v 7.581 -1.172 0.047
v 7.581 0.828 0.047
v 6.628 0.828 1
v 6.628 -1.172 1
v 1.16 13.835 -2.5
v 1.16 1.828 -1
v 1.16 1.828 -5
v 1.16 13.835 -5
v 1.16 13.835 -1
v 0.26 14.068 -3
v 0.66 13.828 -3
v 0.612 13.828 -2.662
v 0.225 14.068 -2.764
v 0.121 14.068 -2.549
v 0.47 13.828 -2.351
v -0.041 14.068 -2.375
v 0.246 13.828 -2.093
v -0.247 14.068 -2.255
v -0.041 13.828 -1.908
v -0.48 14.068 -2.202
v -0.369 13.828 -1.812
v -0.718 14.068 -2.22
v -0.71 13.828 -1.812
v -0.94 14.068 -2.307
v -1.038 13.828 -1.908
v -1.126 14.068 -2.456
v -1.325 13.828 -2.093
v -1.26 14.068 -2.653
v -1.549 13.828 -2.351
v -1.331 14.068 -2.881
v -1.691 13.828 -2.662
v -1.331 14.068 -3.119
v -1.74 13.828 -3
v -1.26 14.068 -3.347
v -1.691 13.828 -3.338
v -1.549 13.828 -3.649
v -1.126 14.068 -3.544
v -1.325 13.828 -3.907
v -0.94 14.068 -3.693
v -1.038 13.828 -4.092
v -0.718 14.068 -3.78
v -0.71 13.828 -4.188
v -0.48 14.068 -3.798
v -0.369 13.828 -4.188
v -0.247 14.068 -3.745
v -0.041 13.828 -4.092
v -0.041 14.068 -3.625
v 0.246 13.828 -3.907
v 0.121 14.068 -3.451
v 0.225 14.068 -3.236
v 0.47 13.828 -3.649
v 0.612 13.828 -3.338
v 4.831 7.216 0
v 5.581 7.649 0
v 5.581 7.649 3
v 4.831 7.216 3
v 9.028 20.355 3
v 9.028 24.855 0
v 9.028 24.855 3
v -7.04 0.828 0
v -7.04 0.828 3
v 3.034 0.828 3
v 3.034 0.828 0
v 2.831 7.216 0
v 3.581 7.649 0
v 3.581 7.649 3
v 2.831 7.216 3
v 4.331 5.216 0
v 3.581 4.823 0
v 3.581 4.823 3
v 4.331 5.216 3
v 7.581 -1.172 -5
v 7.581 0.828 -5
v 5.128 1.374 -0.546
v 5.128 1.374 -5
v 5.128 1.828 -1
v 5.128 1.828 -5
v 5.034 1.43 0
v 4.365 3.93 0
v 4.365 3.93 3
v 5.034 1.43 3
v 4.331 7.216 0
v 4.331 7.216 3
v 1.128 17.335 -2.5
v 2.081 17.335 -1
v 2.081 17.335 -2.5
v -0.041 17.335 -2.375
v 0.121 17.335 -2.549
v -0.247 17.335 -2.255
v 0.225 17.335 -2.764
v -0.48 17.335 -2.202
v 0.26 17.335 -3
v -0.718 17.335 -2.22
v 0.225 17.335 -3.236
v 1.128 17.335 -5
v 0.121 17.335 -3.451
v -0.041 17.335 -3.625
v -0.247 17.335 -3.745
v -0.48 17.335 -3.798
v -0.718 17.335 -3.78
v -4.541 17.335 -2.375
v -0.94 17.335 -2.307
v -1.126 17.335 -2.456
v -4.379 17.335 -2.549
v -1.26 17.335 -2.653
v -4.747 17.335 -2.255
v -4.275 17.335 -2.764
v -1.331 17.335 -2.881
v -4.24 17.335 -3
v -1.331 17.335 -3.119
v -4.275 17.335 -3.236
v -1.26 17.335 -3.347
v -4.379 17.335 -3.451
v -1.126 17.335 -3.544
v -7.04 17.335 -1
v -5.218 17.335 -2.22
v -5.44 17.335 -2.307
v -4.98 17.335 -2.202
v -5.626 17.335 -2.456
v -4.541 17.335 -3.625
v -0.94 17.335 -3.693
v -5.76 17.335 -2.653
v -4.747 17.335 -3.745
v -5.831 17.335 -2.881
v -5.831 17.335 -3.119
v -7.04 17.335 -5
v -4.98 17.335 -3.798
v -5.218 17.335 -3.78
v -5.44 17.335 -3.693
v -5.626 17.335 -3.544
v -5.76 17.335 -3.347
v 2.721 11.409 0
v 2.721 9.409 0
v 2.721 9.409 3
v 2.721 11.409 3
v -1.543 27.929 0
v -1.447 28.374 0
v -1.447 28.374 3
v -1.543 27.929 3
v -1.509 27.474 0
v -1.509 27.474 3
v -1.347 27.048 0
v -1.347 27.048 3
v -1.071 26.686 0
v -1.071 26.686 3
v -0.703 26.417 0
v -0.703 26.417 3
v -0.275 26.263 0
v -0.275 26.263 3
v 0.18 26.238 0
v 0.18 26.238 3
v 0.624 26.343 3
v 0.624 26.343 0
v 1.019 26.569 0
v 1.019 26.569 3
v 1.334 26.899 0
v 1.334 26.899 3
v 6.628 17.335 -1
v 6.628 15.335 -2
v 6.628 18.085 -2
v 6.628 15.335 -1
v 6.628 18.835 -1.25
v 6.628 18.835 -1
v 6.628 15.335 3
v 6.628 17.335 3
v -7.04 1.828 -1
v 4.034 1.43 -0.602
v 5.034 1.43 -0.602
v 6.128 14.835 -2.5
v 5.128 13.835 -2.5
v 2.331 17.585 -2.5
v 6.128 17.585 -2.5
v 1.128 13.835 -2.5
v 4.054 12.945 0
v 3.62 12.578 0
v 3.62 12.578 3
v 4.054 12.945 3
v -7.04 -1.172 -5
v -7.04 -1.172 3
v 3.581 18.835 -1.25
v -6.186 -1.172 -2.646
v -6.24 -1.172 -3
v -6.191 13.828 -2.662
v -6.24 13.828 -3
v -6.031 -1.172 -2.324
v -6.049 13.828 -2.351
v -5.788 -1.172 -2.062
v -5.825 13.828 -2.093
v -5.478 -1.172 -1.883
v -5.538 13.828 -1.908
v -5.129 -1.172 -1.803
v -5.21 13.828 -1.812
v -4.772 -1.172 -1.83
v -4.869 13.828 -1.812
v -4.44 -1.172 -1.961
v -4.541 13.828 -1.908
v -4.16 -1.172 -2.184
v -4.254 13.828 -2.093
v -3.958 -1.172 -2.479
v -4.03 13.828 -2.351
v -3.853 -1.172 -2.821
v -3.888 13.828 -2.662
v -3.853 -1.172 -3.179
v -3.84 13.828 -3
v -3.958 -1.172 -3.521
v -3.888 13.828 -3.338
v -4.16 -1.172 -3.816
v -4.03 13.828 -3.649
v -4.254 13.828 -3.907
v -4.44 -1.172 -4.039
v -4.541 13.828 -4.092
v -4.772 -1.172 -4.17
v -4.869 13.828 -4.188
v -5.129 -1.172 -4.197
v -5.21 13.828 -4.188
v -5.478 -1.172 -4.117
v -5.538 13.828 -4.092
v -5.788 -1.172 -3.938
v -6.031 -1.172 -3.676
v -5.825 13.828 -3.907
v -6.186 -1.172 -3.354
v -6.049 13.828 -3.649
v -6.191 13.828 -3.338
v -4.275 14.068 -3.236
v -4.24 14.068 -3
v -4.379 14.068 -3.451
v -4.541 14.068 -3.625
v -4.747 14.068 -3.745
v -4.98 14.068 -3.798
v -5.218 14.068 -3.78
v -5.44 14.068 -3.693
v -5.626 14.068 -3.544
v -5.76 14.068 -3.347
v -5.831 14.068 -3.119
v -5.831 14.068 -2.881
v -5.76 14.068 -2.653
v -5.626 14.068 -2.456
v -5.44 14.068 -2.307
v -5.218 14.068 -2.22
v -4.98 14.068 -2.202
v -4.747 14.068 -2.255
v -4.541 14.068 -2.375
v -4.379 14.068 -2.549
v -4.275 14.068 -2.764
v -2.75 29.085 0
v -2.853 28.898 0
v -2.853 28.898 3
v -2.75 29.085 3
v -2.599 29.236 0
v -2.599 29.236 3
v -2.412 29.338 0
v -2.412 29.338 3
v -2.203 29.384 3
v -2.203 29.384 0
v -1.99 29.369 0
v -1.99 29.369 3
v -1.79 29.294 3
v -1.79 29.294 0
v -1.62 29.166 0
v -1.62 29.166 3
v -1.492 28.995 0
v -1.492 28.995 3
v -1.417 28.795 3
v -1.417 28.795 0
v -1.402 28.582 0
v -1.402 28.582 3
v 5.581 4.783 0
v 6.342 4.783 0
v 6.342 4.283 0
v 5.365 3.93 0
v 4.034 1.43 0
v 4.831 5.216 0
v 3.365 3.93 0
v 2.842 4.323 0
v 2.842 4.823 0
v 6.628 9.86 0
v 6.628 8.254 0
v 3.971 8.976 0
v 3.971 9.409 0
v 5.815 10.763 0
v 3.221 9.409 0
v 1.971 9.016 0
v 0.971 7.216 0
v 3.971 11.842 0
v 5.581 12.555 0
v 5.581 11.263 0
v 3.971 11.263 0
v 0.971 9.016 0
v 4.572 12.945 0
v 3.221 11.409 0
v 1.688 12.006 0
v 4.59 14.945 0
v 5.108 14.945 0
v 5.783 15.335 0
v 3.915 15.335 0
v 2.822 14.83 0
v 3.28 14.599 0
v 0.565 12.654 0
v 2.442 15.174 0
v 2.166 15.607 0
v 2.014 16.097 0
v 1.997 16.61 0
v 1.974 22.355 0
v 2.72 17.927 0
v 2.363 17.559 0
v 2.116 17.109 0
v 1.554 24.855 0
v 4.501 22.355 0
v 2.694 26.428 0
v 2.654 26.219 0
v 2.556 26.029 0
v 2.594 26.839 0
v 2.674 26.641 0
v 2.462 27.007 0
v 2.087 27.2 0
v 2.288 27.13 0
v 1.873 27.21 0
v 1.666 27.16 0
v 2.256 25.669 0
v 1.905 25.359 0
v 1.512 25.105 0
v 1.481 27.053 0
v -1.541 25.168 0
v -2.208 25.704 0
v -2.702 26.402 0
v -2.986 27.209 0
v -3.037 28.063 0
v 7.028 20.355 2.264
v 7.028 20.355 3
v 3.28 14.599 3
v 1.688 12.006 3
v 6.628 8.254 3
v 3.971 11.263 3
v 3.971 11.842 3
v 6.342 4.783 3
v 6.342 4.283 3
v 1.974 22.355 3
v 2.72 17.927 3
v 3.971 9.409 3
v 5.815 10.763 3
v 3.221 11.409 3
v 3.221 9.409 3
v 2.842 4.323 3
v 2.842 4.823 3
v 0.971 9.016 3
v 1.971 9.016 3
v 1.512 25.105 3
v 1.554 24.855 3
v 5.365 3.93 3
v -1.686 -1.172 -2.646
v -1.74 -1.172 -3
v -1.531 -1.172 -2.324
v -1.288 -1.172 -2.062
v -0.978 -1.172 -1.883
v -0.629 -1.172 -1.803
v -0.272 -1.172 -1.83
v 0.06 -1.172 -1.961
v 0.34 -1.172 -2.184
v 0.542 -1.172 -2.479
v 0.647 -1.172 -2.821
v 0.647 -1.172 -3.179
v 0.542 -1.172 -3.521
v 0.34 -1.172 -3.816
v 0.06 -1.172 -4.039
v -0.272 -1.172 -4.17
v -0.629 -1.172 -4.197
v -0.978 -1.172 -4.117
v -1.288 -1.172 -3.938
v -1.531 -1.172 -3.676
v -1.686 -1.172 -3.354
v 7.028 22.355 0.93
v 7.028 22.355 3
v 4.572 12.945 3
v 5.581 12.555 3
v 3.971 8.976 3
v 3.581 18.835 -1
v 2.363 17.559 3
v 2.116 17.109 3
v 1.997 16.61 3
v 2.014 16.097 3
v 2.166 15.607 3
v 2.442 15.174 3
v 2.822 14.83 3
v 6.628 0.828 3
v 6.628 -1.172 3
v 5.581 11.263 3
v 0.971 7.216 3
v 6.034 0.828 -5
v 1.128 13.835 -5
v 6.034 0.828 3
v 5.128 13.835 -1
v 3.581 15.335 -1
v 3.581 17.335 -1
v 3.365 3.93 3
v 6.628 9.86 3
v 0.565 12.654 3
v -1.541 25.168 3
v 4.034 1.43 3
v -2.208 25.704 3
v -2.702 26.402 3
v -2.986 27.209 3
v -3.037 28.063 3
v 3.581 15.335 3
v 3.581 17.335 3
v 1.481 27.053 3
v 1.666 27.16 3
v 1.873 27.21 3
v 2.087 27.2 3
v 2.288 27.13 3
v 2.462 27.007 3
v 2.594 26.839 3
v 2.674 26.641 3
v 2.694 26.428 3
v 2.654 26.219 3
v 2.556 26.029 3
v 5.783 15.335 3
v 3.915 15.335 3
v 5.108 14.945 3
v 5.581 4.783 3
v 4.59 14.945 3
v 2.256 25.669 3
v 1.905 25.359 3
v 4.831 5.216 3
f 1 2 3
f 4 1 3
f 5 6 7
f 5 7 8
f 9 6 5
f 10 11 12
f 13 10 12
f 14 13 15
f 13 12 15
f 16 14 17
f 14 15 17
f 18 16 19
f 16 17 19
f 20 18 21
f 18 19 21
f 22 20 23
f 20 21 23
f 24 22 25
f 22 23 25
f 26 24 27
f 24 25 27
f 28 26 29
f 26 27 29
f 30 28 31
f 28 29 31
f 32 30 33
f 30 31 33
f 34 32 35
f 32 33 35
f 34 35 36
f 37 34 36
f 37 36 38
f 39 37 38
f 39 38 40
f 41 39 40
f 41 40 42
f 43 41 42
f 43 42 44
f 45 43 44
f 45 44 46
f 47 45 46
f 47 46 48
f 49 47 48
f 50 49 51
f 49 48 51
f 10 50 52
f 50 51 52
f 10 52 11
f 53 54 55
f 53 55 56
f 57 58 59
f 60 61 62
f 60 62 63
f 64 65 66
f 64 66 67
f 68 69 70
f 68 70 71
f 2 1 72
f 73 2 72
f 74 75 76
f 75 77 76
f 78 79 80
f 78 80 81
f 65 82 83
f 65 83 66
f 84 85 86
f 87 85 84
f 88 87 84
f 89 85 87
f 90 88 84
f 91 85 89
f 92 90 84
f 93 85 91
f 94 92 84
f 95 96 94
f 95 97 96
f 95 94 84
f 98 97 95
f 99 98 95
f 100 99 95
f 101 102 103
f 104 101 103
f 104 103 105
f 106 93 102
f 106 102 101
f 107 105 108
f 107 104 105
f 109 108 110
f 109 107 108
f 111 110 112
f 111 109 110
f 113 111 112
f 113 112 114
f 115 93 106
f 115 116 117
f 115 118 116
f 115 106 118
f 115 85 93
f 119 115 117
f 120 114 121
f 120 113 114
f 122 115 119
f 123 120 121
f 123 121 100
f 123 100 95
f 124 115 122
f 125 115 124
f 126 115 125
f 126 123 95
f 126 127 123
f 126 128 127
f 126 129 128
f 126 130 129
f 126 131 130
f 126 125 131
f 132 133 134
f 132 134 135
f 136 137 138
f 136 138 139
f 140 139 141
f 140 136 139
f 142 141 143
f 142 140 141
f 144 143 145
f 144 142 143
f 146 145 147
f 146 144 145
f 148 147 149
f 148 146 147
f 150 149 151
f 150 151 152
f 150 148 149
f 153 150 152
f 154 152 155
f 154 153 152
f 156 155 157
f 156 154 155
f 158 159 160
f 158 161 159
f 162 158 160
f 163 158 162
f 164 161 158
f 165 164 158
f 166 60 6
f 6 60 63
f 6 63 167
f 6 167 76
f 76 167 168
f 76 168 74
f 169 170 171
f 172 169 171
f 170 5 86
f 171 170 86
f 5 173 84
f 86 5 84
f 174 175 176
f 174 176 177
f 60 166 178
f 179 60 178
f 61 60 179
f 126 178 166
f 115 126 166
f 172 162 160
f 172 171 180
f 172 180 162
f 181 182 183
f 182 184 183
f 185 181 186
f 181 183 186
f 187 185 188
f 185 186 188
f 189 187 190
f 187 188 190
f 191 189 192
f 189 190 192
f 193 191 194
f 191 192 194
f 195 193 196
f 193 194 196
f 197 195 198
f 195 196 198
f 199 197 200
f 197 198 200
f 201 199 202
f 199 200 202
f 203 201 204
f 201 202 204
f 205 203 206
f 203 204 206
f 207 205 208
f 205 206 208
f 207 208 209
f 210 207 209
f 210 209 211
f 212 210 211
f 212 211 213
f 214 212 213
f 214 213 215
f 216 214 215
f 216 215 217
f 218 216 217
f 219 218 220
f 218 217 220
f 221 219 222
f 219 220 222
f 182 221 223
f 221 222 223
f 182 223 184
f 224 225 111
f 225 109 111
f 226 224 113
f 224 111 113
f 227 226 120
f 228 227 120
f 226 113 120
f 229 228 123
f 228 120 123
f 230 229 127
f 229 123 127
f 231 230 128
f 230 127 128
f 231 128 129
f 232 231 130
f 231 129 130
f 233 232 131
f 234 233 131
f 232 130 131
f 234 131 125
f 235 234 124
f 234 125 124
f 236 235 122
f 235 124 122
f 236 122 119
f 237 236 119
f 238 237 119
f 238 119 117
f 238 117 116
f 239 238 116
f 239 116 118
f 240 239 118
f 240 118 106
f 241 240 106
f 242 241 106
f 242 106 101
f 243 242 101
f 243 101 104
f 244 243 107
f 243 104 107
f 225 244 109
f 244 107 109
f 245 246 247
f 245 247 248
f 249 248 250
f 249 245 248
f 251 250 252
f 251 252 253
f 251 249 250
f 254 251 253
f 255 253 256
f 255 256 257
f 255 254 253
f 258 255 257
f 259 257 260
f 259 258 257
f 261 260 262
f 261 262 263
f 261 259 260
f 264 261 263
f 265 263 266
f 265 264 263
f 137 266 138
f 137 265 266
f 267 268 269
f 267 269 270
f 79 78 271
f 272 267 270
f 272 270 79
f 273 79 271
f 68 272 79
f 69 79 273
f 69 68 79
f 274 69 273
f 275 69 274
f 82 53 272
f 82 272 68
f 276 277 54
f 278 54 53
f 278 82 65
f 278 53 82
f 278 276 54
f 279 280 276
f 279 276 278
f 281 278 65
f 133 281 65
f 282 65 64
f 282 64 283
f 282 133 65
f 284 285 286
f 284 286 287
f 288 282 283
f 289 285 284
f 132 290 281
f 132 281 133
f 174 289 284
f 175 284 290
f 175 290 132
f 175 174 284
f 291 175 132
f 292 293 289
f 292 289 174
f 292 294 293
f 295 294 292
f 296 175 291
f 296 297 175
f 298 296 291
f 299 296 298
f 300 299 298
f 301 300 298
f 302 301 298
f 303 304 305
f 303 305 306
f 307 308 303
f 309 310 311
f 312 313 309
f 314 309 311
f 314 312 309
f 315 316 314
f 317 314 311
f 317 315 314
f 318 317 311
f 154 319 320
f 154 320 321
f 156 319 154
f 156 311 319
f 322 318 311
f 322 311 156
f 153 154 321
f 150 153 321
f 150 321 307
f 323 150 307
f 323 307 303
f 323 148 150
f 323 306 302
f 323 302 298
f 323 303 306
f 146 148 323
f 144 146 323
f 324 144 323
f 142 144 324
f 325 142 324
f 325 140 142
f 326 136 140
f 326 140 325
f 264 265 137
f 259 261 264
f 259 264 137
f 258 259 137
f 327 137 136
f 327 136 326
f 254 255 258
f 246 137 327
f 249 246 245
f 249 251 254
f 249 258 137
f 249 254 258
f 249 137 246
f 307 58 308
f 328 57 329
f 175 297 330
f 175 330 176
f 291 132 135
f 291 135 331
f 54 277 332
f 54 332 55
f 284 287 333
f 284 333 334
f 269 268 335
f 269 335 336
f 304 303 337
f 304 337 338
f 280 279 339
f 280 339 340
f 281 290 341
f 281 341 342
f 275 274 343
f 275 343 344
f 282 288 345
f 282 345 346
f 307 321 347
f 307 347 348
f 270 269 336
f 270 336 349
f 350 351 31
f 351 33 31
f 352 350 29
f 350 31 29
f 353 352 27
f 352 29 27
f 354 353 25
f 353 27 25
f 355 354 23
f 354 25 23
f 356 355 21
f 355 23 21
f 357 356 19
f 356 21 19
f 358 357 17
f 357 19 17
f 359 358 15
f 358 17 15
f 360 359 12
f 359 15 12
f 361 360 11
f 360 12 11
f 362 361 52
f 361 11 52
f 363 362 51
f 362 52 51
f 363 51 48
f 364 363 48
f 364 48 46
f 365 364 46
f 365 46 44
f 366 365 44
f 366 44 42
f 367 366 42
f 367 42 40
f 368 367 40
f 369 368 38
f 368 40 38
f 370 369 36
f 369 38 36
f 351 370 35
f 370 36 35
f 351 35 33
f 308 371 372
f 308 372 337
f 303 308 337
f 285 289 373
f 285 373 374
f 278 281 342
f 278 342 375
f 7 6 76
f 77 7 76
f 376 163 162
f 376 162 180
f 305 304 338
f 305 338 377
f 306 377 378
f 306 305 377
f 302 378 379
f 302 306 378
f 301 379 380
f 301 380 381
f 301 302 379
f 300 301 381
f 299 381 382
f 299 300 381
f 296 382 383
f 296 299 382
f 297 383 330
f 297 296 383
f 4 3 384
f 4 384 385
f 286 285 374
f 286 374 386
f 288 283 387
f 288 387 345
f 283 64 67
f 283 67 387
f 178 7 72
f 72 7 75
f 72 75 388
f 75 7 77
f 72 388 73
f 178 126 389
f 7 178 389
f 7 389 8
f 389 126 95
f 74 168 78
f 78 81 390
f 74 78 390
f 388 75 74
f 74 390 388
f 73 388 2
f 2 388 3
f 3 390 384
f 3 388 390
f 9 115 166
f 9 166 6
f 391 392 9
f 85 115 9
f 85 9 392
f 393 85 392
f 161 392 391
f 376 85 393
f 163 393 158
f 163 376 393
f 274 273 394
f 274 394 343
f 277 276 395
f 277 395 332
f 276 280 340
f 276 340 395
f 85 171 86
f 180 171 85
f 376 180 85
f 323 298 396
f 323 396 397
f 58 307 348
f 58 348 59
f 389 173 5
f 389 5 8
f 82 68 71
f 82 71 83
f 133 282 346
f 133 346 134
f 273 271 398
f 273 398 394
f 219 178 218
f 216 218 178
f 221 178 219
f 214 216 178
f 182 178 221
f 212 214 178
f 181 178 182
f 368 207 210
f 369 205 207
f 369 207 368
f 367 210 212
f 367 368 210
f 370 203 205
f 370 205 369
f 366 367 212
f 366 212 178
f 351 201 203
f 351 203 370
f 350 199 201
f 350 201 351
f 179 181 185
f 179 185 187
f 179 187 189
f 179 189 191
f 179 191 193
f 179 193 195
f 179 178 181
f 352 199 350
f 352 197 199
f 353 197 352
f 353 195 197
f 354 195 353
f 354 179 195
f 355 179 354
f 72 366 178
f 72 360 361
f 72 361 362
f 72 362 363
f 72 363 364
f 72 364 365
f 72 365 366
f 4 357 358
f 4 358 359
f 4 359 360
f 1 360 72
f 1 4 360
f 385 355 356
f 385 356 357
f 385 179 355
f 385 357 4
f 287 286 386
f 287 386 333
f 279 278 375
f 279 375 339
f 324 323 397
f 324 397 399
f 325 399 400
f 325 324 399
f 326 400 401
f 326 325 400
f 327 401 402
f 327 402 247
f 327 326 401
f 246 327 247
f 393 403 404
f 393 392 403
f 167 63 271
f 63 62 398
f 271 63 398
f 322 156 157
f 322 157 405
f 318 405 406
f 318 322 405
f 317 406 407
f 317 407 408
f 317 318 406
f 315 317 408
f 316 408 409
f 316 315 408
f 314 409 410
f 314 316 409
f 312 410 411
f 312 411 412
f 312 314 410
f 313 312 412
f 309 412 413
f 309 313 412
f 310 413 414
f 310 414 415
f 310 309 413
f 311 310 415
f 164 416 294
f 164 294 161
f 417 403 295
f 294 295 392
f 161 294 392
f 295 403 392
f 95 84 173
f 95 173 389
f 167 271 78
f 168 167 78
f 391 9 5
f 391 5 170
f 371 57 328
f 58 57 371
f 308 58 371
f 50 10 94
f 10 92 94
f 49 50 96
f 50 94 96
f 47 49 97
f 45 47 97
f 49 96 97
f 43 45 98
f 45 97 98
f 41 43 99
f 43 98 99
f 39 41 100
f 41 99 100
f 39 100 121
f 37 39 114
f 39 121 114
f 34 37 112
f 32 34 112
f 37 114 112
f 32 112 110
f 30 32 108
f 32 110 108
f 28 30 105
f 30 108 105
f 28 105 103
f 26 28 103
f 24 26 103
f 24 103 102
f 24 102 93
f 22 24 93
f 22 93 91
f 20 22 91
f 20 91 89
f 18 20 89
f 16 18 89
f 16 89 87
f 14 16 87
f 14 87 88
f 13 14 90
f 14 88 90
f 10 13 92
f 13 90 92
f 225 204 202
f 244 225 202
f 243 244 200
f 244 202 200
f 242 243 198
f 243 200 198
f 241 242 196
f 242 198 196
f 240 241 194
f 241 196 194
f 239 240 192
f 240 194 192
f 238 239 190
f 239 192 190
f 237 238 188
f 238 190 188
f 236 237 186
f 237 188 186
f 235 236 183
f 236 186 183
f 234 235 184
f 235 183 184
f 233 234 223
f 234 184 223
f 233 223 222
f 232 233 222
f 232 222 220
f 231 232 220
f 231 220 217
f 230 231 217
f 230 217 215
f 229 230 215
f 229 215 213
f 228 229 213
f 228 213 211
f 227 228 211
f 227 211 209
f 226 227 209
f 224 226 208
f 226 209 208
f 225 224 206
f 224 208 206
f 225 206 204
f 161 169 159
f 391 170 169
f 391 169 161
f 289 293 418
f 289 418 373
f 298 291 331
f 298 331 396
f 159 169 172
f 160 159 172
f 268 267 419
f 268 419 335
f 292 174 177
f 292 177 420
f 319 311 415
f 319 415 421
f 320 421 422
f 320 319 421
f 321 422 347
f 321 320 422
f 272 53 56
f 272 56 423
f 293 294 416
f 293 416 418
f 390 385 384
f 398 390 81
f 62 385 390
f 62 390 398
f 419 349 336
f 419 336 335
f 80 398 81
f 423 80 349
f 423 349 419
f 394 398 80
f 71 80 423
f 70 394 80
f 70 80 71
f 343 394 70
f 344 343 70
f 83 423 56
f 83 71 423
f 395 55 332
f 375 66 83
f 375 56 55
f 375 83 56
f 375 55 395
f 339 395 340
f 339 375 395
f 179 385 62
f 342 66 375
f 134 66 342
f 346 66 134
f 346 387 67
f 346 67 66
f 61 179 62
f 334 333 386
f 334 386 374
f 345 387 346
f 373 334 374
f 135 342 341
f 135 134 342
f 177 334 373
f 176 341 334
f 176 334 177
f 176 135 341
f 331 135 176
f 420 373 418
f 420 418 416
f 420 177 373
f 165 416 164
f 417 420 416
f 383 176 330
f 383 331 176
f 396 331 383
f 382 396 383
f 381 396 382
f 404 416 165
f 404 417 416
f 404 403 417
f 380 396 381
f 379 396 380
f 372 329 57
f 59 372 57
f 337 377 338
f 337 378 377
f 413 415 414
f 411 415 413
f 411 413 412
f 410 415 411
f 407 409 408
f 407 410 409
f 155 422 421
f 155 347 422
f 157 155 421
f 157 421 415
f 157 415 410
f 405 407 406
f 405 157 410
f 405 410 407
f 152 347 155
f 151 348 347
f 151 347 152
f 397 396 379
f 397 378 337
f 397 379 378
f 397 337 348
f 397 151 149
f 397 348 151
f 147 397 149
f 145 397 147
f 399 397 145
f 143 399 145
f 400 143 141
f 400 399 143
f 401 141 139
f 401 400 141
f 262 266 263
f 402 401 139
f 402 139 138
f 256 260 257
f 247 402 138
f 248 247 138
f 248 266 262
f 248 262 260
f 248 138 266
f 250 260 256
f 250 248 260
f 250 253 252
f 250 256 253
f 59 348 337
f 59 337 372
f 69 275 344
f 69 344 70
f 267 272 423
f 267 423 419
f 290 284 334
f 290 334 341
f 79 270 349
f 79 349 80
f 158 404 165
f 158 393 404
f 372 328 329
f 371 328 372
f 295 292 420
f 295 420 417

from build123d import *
from OCP.BRepAlgoAPI import BRepAlgoAPI_Cut
from OCP.TopTools import TopTools_ListOfShape

# Parameters (mm, degrees)
BOSS_SWITCH_BODY_DEPTH                    = 3
SKETCH1_W                                 = 4
SKETCH1_H                                 = 3.5
BOSS_FLANGE_WIDTH_DEPTH                   = 5
BOSS_FLANGE_HEIGHT_REACH                  = 35.863
SKETCH2_W                                 = 4
SKETCH2_H                                 = 2
SKETCH2_W_2                               = 8
CUT_UP_TO_DOWN_DERAILLEUR_CLEARANCE_REACH = 21.467
SKETCH10_W                                = 2.453096586
SKETCH10_H                                = 3
SKETCH17_W                                = 12.1675
SKETCH17_H                                = 4
BOSS_FLANGE_SUPPORT_DEPTH                 = 14.506540875
TAP_DRILL_FOR_M2X0_4_TAP1_D               = 1.6
M2_CLEARANCE_HOLE2_D                      = 2.4
M2_CLEARANCE_HOLE2_DEPTH                  = 15
M2_CLEARANCE_HOLE2_TIP                    = 0.721032743
CHAMFER_FLANGE_SUPPORT_SIZE               = 1.5
CHAMFER_FLANGE_SUPPORT_2_SIZE             = 1.5
CHAMFER_FLANGE_SUPPORT_3_SIZE             = 1
SKETCH23_W                                = 3.9675
SKETCH23_H                                = 12.006540875
CUT_GAP_FOR_PRINTING_DEPTH                = 32.000499688
SKETCH25_W                                = 0.953096586
SKETCH25_H                                = 3.5
CUT_DERAILLEUR_CLEARANCE_DEPTH            = 32.145320369
CHAMFER8_SIZE                             = 1
CUT_UP_TO_DOWN_CANTILEVER_SLOPE_REACH     = 31.869
SKETCH26_W                                = 12.477246204
SKETCH26_H                                = 5.771077126
CUT_WIDE_DERAILLEUR_CLEARANCE_DEPTH       = 33.195879702
CUT_WIDE_DERAILLEUR_CLEARANCE_DEPTH_BACK  = 4
SKETCH27_W                                = 2.5
SKETCH27_H                                = 4.999999471
CHAMFER9_SIZE                             = 1.25
SKETCH28_W                                = 3.046903414
SKETCH28_H                                = 1.5
CUT_EXTRUDE1_DEPTH                        = 1


# Some blends are built 0.0001 mm under size
with BuildPart() as part:
    # Sketch-SwitchBossUp → Boss-Switch Body (new body)
    with BuildSketch(Plane.XY):
        with BuildLine():
            Line((5.581091201, 12.555242641), (5.581100766, 11.263016279))
            Line((5.581100766, 11.263016279), (3.971265023, 11.263016279))
            Line((3.971265023, 11.263016279), (3.97126394, 11.842410935))
            Line((3.97126394, 11.842410935), (3.221271341, 11.409402506))
            Line((3.221271341, 11.409402506), (3.221271341, 9.409402506))
            Line((3.221271341, 9.409402506), (3.971278743, 8.976385531))
            Line((3.971278743, 8.976385531), (3.971278743, 9.409408058))
            Line((3.971278743, 9.409408058), (5.815189336, 10.763016279))
            Line((5.815189336, 10.763016279), (6.627976927, 9.860324207))
            Line((6.627976927, 9.860324207), (6.627976927, 8.253837221))
            Line((6.627976927, 8.253837221), (5.581127512, 7.649438429))
            Line((5.581127512, 7.649438429), (4.831138119, 7.216431851))
            Line((4.831138119, 7.216431851), (4.831138119, 5.216431851))
            Line((4.831138119, 5.216431851), (5.58114552, 4.783414875))
            Line((5.58114552, 4.783414875), (6.342350466, 4.783414875))
            Line((6.342350466, 4.783414875), (6.342350466, 4.283414875))
            Line((6.342350466, 4.283414875), (5.364591217, 3.930477929))
            Line((5.364591217, 3.930477929), (4.364591217, 3.930477929))
            Line((4.364591217, 3.930477929), (5.034464198, 1.430477929))
            Line((5.034464198, 1.430477929), (6.034464198, 0.828149001))
            Line((6.034464198, 0.828149001), (6.627976927, 0.828149001))
            Line((6.627976927, 0.828149001), (6.627976927, -1.171850999))
            Line((6.627976927, -1.171850999), (5.034464198, -1.171850999))
            Line((5.034464198, -1.171850999), (3.034464198, -1.171850999))
            Line((3.034464198, -1.171850999), (3.034464198, 0.828149001))
            Line((3.034464198, 0.828149001), (4.034464198, 1.430477929))
            Line((4.034464198, 1.430477929), (3.364591217, 3.930477929))
            Line((3.364591217, 3.930477929), (2.842350466, 4.323450264))
            Line((2.842350466, 4.323450264), (2.842350466, 4.823450264))
            Line((2.842350466, 4.823450264), (3.58114552, 4.823450264))
            Line((3.58114552, 4.823450264), (4.331138119, 5.21642815))
            Line((4.331138119, 5.21642815), (4.331138119, 7.21642815))
            Line((4.331138119, 7.21642815), (3.581130717, 7.649445125))
            Line((3.581130717, 7.649445125), (2.83112652, 7.216422599))
            Line((2.83112652, 7.216422599), (0.971281652, 7.216422599))
            Line((0.971281652, 7.216422599), (0.971281652, 9.016422599))
            Line((0.971281652, 9.016422599), (1.971281652, 9.016422599))
            Line((1.971281652, 9.016422599), (2.721271341, 9.409398805))
            Line((2.721271341, 9.409398805), (2.721271341, 11.409398805))
            Line((2.721271341, 11.409398805), (1.688483029, 12.005679416))
            Line((1.688483029, 12.005679416), (0.565243661, 12.654181967))
            Line((0.565243661, 12.654181967), (-1.541303694, 25.167805745))
            ThreePointArc((-1.541303694, 25.167805745), (-2.872284003, 26.795385437), (-2.852546321, 28.897797067))
            ThreePointArc((-2.852546321, 28.897797067), (-1.887813913, 29.338582026), (-1.447028953, 28.373849618))
            ThreePointArc((-1.447028953, 28.373849618), (-0.703448682, 26.416936722), (1.333779254, 26.898727173))
            ThreePointArc((1.333779254, 26.898727173), (2.379722745, 27.074801628), (2.555797201, 26.028858137))
            ThreePointArc((2.555797201, 26.028858137), (2.086504637, 25.507104397), (1.511513111, 25.104801997))
            Line((1.511513111, 25.104801997), (1.553598189, 24.854801997))
            Line((1.553598189, 24.854801997), (9.027976927, 24.854801997))
            Line((9.027976927, 24.854801997), (9.027976927, 22.354801997))
            Line((9.027976927, 22.354801997), (9.027976927, 20.354801997))
            Line((9.027976927, 20.354801997), (7.027976927, 20.354801997))
            Line((7.027976927, 20.354801997), (7.027976927, 22.354801997))
            Line((7.027976927, 22.354801997), (1.974448974, 22.354801997))
            Line((1.974448974, 22.354801997), (2.719778232, 17.927287042))
            ThreePointArc((2.719778232, 17.927287042), (2.013826204, 16.096957693), (3.280124137, 14.598637521))
            Line((3.280124137, 14.598637521), (3.620297651, 12.577888564))
            Line((3.620297651, 12.577888564), (4.054320079, 12.944956709))
            Line((4.054320079, 12.944956709), (4.59020366, 14.944960676))
            Line((4.59020366, 14.944960676), (3.915161346, 15.334689876))
            Line((3.915161346, 15.334689876), (3.581073513, 15.334689876))
            Line((3.581073513, 15.334689876), (3.581073513, 17.334689876))
            Line((3.581073513, 17.334689876), (5.725580434, 17.334689876))
            Line((5.725580434, 17.334689876), (6.627976927, 17.334689876))
            Line((6.627976927, 17.334689876), (6.627976927, 15.334689876))
            Line((6.627976927, 15.334689876), (5.782854352, 15.334689876))
            Line((5.782854352, 15.334689876), (5.107841751, 14.944964507))
            Line((5.107841751, 14.944964507), (4.571958169, 12.944960541))
            Line((4.571958169, 12.944960541), (5.581091201, 12.555242641))
        make_face()
    extrude(amount=BOSS_SWITCH_BODY_DEPTH)

    # Sketch1 → Boss-Flange Width (add)
    with BuildSketch(Plane(origin=(0, 0, 0), x_dir=(-1, 0, 0), z_dir=(0, 0, -1))):
        Polygon((-7.581073513, -1.171850999), (0.412170615, -1.171850999), (0.412170615, 0.828149001), (-3.034464198, 0.828149001), (-4.034464198, 1.430477929), (-5.034464198, 1.430477929), (-6.034464198, 0.828149001), (-7.581073513, 0.828149001), align=None)
        with Locations((-5.581073513, 17.084689876)):
            Rectangle(SKETCH1_W, SKETCH1_H)
    extrude(amount=BOSS_FLANGE_WIDTH_DEPTH)

    # Sketch2 → Boss-Flange Height (add, up to next)
    with BuildSketch(Plane(origin=(-7.039523073, 0, 0), x_dir=(0, 0, -1), z_dir=(1, 0, 0)), mode=Mode.PRIVATE) as boss_flange_height_sk1:
        with Locations((3, 16.334689876)):
            Rectangle(SKETCH2_W, SKETCH2_H)
    boss_flange_height_tool1 = extrude(boss_flange_height_sk1.sketch, amount=BOSS_FLANGE_HEIGHT_REACH, mode=Mode.PRIVATE) - part.part
    # Sketch2 → Boss-Flange Height (add, up to next)
    with BuildSketch(Plane(origin=(-7.039523073, 0, 0), x_dir=(0, 0, -1), z_dir=(1, 0, 0)), mode=Mode.PRIVATE) as boss_flange_height_sk2:
        with Locations((1, -0.171850999)):
            Rectangle(SKETCH2_W_2, SKETCH2_H)
    boss_flange_height_tool2 = extrude(boss_flange_height_sk2.sketch, amount=BOSS_FLANGE_HEIGHT_REACH, mode=Mode.PRIVATE) - part.part
    add(boss_flange_height_tool1.solids().sort_by_distance((-7.039523, 16.33469, -3))[0])
    add(boss_flange_height_tool2.solids().sort_by_distance((-7.039523, -0.171851, -1))[0])

    # Sketch10 → Cut-Up-To-Down Derailleur Clearance (cut, up to next)
    with BuildSketch(Plane(origin=(0, 15.334689876, 0), x_dir=(1, 0, 0), z_dir=(0, 1, 0)), mode=Mode.PRIVATE) as cut_up_to_down_derailleur_clearance_sk1:
        with Locations((6.35452522, 3.5)):
            Rectangle(SKETCH10_W, SKETCH10_H)
    cut_up_to_down_derailleur_clearance_tool1 = extrude(cut_up_to_down_derailleur_clearance_sk1.sketch, amount=CUT_UP_TO_DOWN_DERAILLEUR_CLEARANCE_REACH, mode=Mode.PRIVATE) & part.part
    add(cut_up_to_down_derailleur_clearance_tool1.solids().sort_by_distance((6.354525, 15.33469, -3.5))[0], mode=Mode.SUBTRACT)

    # Sketch17 → Boss-Flange Support (add)
    with BuildSketch(Plane.XZ.offset(-15.334689876)):
        with Locations((-0.955773073, -3)):
            Rectangle(SKETCH17_W, SKETCH17_H)
    extrude(amount=BOSS_FLANGE_SUPPORT_DEPTH)

    # Tap Drill for M2x0.4 Tap1 (through all)
    with Locations(Plane(origin=(0, -1.171850999, 0), x_dir=(-1, 0, 0), z_dir=(0, -1, 0))):
        with Locations((5.039523073, 3), (0.539523073, 3)):
            Hole(TAP_DRILL_FOR_M2X0_4_TAP1_D / 2)

    # M2 Clearance Hole2
    with Locations(Plane.XZ.offset(1.171850999)):
        with Locations((-5.039523073, -3), (-0.539523073, -3)):
            Hole(M2_CLEARANCE_HOLE2_D / 2, depth=M2_CLEARANCE_HOLE2_DEPTH)
            with Locations((0, 0, -(M2_CLEARANCE_HOLE2_DEPTH + M2_CLEARANCE_HOLE2_TIP / 2))):  # 118° drill point
                Cone(0, M2_CLEARANCE_HOLE2_D / 2, M2_CLEARANCE_HOLE2_TIP, mode=Mode.SUBTRACT)

    # Chamfer-Flange Support
    chamfer_flange_support_edges = [part.edges().sort_by_distance(p)[0] for p in [
        (3.581073513, 17.334689876, -3),
    ]]
    chamfer(chamfer_flange_support_edges, length=CHAMFER_FLANGE_SUPPORT_SIZE - 0.0001)  # a hair under: the kernel refuses the full size

    # Chamfer-Flange Support 2
    chamfer_flange_support_2_edges = [part.edges().sort_by_distance(p)[0] for p in [
        (5.127976927, 17.084689876, -2),
        (5.127976927, 15.334689876, -1.5),
    ]]
    chamfer(chamfer_flange_support_2_edges, length=CHAMFER_FLANGE_SUPPORT_2_SIZE)

    # Chamfer-Flange Support 3
    chamfer_flange_support_3_edges = [part.edges().sort_by_distance(p)[0] for p in [
        (-2.002529437, 0.828149001, -1),
    ]]
    chamfer(chamfer_flange_support_3_edges, length=CHAMFER_FLANGE_SUPPORT_3_SIZE)

    # Sketch23 → Cut-Gap for Printing (cut, through all)
    with BuildSketch(Plane.XY.offset(-1)):
        with Locations((3.144226927, 7.831419439)):
            Rectangle(SKETCH23_W, SKETCH23_H)
    extrude(amount=-CUT_GAP_FOR_PRINTING_DEPTH, mode=Mode.SUBTRACT)

    # Sketch25 → Cut-Derailleur Clearance (cut, through all)
    with BuildSketch(Plane.XY):
        with Locations((7.10452522, 17.084689876)):
            Rectangle(SKETCH25_W, SKETCH25_H)
    extrude(amount=-CUT_DERAILLEUR_CLEARANCE_DEPTH, mode=Mode.SUBTRACT)

    # Chamfer8
    # the kernel refuses this chamfer: 1 mm, written as the material it adds along each edge
    with BuildSketch(Plane(origin=(6.627976927, 0.828149001, 0), x_dir=(1, 0, 0), z_dir=(0, -1, 0))) as chamfer8_piece_1_section:
        Polygon((CHAMFER8_SIZE, 0), (0, CHAMFER8_SIZE), (0, 0), align=None)
    chamfer8_piece_1 = extrude(amount=2, mode=Mode.PRIVATE)
    chamfer8_piece_1 = split(chamfer8_piece_1, bisect_by=Plane(origin=(7.581073513, 0.828149001, 0), z_dir=(-1, 0, 0)), keep=Keep.TOP, mode=Mode.PRIVATE)
    add(chamfer8_piece_1)

    # Sketch26 → Cut-Up-to-Down Cantilever Slope (cut, up to next)
    with BuildSketch(Plane(origin=(-3.086642121, 5.589000146, 8.383500218), x_dir=(-0.9561404375276108, -0.1624764728289173, -0.24371470924337582), z_dir=(0.2929086269205964, -0.5303712883154423, -0.795556932473163)), mode=Mode.PRIVATE) as cut_up_to_down_cantilever_slope_sk1:
        with Locations((-13.791615152, 17.794906754)):
            Rectangle(SKETCH26_W, SKETCH26_H)
    cut_up_to_down_cantilever_slope_tool1 = extrude(cut_up_to_down_cantilever_slope_sk1.sketch, amount=CUT_UP_TO_DOWN_CANTILEVER_SLOPE_REACH, mode=Mode.PRIVATE) & part.part
    add(cut_up_to_down_cantilever_slope_tool1.solids().sort_by_distance((10.100079, 22.636071, 1.873881))[0], mode=Mode.SUBTRACT)


with BuildPart() as cut_wide_derailleur_clearance_tool:
    # Sketch27 → Cut-Wide Derailleur Clearance (new, two sides: drawn at the far end of the back side and taken through both)
    with BuildSketch(Plane(origin=(5.127976927, 0, 0), x_dir=(0, 0, -1), z_dir=(1, 0, 0)).offset(-CUT_WIDE_DERAILLEUR_CLEARANCE_DEPTH_BACK)):
        with Locations((3.75, 16.334689611)):
            Rectangle(SKETCH27_W, SKETCH27_H)
    extrude(amount=CUT_WIDE_DERAILLEUR_CLEARANCE_DEPTH + CUT_WIDE_DERAILLEUR_CLEARANCE_DEPTH_BACK)


with BuildPart() as part_1:
    add(part.part)

    # Cut-Wide Derailleur Clearance: cut by cut_wide_derailleur_clearance_tool, with a tolerance
    cut_wide_derailleur_clearance_stock = TopTools_ListOfShape()
    cut_wide_derailleur_clearance_stock.Append(part_1.part.wrapped)
    cut_wide_derailleur_clearance_tools = TopTools_ListOfShape()
    cut_wide_derailleur_clearance_tools.Append(cut_wide_derailleur_clearance_tool.part.wrapped)
    cut_wide_derailleur_clearance_cut = BRepAlgoAPI_Cut()
    cut_wide_derailleur_clearance_cut.SetArguments(cut_wide_derailleur_clearance_stock)
    cut_wide_derailleur_clearance_cut.SetTools(cut_wide_derailleur_clearance_tools)
    cut_wide_derailleur_clearance_cut.SetFuzzyValue(0.00001)
    cut_wide_derailleur_clearance_cut.Build()
    add(Compound.cast(cut_wide_derailleur_clearance_cut.Shape()).solids(), mode=Mode.REPLACE)

    # Chamfer9
    chamfer9_edges = [part_1.edges().sort_by_distance(p)[0] for p in [
        (4.85452522, 18.834689347, -2.5),
    ]]
    chamfer(chamfer9_edges, length=CHAMFER9_SIZE)

    # Sketch28 → Cut-Extrude1 (cut)
    with BuildSketch(Plane.XY.offset(-1)):
        with Locations((5.10452522, 18.084689876)):
            Rectangle(SKETCH28_W, SKETCH28_H)
    extrude(amount=CUT_EXTRUDE1_DEPTH, mode=Mode.SUBTRACT)


solid = part_1.part
